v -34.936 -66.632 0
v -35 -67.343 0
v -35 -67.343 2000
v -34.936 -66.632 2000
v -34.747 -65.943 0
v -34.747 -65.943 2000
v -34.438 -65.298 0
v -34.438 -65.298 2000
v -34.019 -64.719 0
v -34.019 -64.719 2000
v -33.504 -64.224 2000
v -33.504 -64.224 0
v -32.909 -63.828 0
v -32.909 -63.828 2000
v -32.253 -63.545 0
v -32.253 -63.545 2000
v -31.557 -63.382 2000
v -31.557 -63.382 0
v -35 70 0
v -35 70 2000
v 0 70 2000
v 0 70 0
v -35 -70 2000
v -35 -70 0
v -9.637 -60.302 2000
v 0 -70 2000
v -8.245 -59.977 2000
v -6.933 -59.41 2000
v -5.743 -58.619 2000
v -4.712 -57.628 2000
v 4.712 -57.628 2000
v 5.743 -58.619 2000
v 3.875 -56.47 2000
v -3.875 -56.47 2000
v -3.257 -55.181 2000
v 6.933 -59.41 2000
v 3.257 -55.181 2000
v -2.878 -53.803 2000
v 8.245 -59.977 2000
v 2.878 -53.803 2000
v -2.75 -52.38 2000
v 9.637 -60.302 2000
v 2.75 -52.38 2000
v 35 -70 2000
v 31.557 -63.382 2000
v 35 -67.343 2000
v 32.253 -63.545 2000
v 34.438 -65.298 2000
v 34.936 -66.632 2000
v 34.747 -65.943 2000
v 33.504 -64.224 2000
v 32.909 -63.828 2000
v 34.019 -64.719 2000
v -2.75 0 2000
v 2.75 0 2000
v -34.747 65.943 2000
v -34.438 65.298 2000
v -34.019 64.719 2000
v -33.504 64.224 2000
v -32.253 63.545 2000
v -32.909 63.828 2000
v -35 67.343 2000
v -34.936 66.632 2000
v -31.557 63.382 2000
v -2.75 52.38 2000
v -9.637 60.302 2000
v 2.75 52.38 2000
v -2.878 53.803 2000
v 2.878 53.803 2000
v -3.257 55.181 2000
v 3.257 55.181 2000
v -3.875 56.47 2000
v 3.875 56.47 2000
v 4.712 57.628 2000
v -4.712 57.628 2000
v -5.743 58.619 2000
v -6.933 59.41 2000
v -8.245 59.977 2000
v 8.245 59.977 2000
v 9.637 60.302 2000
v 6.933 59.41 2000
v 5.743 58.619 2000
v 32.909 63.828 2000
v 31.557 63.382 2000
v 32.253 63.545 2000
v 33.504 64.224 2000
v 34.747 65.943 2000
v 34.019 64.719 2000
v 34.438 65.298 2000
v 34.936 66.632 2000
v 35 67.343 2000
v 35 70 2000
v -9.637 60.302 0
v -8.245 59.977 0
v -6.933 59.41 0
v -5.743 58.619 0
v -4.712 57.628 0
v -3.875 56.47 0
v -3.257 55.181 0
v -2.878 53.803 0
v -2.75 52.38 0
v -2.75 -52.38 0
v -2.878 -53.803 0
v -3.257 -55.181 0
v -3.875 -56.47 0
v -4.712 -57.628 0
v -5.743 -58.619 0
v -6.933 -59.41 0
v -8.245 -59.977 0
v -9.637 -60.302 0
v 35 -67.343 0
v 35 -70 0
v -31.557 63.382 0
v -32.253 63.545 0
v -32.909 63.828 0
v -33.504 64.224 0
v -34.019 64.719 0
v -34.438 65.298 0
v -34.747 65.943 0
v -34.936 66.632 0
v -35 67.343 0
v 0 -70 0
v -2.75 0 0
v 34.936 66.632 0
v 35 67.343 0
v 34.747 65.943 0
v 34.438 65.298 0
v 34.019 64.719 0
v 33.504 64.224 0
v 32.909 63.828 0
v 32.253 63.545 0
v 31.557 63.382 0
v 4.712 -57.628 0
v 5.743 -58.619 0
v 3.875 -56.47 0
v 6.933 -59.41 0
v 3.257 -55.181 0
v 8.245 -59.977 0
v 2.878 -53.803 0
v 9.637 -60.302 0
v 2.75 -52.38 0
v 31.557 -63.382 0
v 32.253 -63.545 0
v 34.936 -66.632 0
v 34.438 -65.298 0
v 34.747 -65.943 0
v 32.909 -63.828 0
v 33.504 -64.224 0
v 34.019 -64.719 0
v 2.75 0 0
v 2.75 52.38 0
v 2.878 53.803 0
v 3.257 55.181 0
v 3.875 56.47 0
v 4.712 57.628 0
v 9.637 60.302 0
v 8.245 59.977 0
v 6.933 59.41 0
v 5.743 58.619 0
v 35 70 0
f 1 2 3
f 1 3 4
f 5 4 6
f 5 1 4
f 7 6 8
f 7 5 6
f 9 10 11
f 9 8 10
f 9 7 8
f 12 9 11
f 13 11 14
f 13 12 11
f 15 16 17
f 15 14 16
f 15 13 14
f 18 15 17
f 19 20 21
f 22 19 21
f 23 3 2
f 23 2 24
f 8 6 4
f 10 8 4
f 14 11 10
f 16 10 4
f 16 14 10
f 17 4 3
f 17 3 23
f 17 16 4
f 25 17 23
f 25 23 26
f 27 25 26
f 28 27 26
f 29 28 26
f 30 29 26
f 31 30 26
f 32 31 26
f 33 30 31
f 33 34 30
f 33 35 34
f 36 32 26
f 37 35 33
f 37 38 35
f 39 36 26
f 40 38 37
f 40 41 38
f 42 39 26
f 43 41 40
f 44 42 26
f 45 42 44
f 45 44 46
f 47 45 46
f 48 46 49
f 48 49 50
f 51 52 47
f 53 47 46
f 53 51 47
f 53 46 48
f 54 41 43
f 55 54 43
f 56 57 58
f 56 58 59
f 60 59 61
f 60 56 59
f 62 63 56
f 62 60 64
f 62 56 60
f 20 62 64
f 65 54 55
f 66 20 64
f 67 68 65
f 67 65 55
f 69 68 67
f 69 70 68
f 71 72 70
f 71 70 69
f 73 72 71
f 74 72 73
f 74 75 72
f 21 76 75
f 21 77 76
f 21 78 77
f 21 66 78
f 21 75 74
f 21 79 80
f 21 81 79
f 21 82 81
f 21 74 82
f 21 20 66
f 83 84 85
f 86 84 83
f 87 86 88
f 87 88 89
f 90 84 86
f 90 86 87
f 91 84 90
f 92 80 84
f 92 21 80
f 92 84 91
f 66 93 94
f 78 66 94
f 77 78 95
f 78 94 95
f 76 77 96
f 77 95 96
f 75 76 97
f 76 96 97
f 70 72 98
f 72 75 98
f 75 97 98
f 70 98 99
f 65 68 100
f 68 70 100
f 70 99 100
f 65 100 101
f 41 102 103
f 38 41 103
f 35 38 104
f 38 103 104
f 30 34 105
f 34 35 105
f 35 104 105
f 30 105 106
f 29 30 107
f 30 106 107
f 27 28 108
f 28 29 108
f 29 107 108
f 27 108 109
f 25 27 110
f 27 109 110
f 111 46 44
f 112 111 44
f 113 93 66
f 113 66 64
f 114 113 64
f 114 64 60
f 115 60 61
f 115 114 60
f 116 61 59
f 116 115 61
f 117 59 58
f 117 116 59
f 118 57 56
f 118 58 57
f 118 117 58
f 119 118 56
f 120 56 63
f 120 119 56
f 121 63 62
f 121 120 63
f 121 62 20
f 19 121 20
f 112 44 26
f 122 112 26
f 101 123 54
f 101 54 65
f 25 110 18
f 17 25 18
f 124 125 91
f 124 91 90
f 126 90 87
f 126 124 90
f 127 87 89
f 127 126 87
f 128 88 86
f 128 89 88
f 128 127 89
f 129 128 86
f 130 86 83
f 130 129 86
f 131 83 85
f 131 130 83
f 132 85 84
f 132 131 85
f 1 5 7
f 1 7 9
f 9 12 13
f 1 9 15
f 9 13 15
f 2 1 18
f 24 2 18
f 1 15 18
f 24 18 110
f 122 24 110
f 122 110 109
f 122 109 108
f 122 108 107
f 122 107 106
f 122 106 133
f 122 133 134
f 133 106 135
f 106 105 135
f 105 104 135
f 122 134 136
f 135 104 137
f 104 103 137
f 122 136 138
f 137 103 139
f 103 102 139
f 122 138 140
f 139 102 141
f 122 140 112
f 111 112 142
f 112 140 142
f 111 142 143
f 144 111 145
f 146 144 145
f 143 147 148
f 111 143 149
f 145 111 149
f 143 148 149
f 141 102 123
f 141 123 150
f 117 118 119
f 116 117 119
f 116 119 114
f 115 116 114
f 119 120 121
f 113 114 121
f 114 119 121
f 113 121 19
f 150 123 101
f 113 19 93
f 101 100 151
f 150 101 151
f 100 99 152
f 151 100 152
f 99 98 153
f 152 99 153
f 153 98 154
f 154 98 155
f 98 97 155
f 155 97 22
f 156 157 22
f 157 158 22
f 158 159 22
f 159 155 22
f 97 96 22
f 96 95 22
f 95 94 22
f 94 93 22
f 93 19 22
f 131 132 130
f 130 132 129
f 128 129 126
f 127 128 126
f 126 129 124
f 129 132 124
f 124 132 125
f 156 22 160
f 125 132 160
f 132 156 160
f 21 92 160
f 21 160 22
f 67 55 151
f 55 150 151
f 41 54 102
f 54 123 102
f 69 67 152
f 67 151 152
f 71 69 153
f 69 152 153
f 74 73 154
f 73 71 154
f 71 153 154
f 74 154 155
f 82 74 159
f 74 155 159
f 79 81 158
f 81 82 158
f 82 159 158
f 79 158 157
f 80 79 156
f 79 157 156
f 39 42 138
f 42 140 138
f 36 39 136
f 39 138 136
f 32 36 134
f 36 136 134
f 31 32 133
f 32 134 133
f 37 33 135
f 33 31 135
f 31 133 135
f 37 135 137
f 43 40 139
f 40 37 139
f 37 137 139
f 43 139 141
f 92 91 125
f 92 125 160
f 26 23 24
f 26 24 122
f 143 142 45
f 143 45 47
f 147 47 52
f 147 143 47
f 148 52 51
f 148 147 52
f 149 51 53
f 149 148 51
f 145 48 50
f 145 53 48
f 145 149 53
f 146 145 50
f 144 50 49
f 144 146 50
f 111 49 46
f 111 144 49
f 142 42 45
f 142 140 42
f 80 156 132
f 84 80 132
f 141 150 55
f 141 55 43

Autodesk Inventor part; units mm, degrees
ref_plane "YZ Plane" through (0, 0, 0) normal (1, 0, 0) x (0, 1, 0)
ref_plane "Start Plane" through (0, 0, 0) normal (0, 0, 1) x (1, 0, 0)
ref_plane "End Plane" through (0, 0, 2000) normal (0, 0, 1) x (1, 0, 0)
sketch "Sketch" plane through (0, 0, 0) normal (0, 0, 1) x (1, 0, 0)
  line L0 (-2.75, 0) -> (-2.75, -52.3795)
  line L1 (-9.6366, -60.3016) -> (-31.5567, -63.3823)
  line L2 (-35, -67.3434) -> (-35, -70)
  line L3 (-35, -70) -> (0, -70)
  line L4 (-18.875, -70) -> (-18.875, -61.6) construction
  line L5 (-25.7112, 0) -> (34.2816, 0) construction
  line L6 (0, 40) -> (0, -70) construction
  line L7 (0, -48) -> (0, 64) construction
  line L8 (2.75, 0) -> (2.75, -52.3795)
  line L9 (9.6366, -60.3016) -> (31.5567, -63.3823)
  line L10 (35, -67.3434) -> (35, -70)
  line L11 (35, -70) -> (0, -70)
  line L12 (-2.75, 0) -> (2.75, 0) construction
  line L13 (-2.75, 0) -> (-2.75, 52.3795)
  line L14 (-9.6366, 60.3016) -> (-31.5567, 63.3823)
  line L15 (-35, 67.3434) -> (-35, 70)
  line L16 (-35, 70) -> (0, 70)
  line L17 (2.75, 0) -> (2.75, 52.3795)
  line L18 (9.6366, 60.3016) -> (31.5567, 63.3823)
  line L19 (35, 67.3434) -> (35, 70)
  line L20 (35, 70) -> (0, 70)
  arc A0 (-35, 67.3434) -> (-31.5567, 63.3823) centre (-31, 67.3434) ccw
  arc A1 (31.5567, 63.3823) -> (35, 67.3434) centre (31, 67.3434) ccw
  arc A2 (35, -67.3434) -> (31.5567, -63.3823) centre (31, -67.3434) ccw
  arc A3 (-31.5567, -63.3823) -> (-35, -67.3434) centre (-31, -67.3434) ccw
  arc A4 (-2.75, 52.3795) -> (-9.6366, 60.3016) centre (-10.75, 52.3795) ccw
  arc A5 (9.6366, 60.3016) -> (2.75, 52.3795) centre (10.75, 52.3795) ccw
  arc A6 (2.75, -52.3795) -> (9.6366, -60.3016) centre (10.75, -52.3795) ccw
  arc A7 (-9.6366, -60.3016) -> (-2.75, -52.3795) centre (-10.75, -52.3795) ccw
  line L21 (0, 98) -> (0, -98) construction
  line L22 (-50.0367, 0) -> (50.0367, 0) construction
  point P0 (-2.75, -59.3338)
  point P1 (-35, -63.8662)
  point P2 (2.75, -59.3338)
  point P3 (35, -63.8662)
  point P4 (18.875, -70)
  point P5 (18.875, -61.6)
  point P6 (-2.75, 59.3338)
  point P7 (-35, 63.8662)
  point P8 (-18.875, 70)
  point P9 (-18.875, 61.6)
  point P10 (2.75, 59.3338)
  point P11 (35, 63.8662)
  point P12 (18.875, 61.6)
  point P13 (18.875, 70)
  dimension "d1" = 2.2662
  dimension "d2" = 8.4
  dimension "d3" = 16.125
  dimension "d4" = 2.75
  dimension "d5" = 35
  dimension "d10" = 70
  dimension "d14" = 4
  dimension "d15" = 8
extrude "Body" add sketch "Sketch" along normal up to surface (2000 mm away) from surface at 0
sketch "Sketch3" plane through (0, 0, 0) normal (0, 0, 1) x (1, 0, 0)
  line L0 (0, 0) -> (10, 0)
ref_plane "Work Plane3" through (0, 0, 0) normal (0, -1, 0) x (1, 0, 0)
sketch "Sketch4" plane through (0, 0, 0) normal (0, -1, 0) x (1, 0, 0)
  line L0 (-2, 0) -> (12, 0) projected
  line L1 (-2, 2000) -> (12, 2000) projected
  dimension "d19" = 2000
equation "\"d2\" = G_T1"
equation "\"d3\" = G_C"
equation "\"d4\" = 0.5 * G_T"
equation "\"d5\" = 0.5 * G_W"
equation "\"d10\" = 0.5 * G_H"
equation "\"d14\" = G_ER"
equation "\"d15\" = G_IR"
equation "\"d6\" = G_L"
equation "\"G_W\" = 70"
equation "\"G_H\" = 140"
equation "\"G_T\" = 5.5"
equation "\"G_T1\" = 8.4"
equation "\"G_C\" = 16.125"
equation "\"G_NG\" = 0.140541"
equation "\"G_L\" = d19"
equation "\"G_ER\" = 0.5 * G_IR"
equation "\"G_IR\" = 8"
equation "\"G_OFFSET_START\" = 0"
equation "\"G_OFFSET_END\" = 0"
properties part number "ISO 657/15 - SB 140x15 - 2000" material "Steel, Mild"
